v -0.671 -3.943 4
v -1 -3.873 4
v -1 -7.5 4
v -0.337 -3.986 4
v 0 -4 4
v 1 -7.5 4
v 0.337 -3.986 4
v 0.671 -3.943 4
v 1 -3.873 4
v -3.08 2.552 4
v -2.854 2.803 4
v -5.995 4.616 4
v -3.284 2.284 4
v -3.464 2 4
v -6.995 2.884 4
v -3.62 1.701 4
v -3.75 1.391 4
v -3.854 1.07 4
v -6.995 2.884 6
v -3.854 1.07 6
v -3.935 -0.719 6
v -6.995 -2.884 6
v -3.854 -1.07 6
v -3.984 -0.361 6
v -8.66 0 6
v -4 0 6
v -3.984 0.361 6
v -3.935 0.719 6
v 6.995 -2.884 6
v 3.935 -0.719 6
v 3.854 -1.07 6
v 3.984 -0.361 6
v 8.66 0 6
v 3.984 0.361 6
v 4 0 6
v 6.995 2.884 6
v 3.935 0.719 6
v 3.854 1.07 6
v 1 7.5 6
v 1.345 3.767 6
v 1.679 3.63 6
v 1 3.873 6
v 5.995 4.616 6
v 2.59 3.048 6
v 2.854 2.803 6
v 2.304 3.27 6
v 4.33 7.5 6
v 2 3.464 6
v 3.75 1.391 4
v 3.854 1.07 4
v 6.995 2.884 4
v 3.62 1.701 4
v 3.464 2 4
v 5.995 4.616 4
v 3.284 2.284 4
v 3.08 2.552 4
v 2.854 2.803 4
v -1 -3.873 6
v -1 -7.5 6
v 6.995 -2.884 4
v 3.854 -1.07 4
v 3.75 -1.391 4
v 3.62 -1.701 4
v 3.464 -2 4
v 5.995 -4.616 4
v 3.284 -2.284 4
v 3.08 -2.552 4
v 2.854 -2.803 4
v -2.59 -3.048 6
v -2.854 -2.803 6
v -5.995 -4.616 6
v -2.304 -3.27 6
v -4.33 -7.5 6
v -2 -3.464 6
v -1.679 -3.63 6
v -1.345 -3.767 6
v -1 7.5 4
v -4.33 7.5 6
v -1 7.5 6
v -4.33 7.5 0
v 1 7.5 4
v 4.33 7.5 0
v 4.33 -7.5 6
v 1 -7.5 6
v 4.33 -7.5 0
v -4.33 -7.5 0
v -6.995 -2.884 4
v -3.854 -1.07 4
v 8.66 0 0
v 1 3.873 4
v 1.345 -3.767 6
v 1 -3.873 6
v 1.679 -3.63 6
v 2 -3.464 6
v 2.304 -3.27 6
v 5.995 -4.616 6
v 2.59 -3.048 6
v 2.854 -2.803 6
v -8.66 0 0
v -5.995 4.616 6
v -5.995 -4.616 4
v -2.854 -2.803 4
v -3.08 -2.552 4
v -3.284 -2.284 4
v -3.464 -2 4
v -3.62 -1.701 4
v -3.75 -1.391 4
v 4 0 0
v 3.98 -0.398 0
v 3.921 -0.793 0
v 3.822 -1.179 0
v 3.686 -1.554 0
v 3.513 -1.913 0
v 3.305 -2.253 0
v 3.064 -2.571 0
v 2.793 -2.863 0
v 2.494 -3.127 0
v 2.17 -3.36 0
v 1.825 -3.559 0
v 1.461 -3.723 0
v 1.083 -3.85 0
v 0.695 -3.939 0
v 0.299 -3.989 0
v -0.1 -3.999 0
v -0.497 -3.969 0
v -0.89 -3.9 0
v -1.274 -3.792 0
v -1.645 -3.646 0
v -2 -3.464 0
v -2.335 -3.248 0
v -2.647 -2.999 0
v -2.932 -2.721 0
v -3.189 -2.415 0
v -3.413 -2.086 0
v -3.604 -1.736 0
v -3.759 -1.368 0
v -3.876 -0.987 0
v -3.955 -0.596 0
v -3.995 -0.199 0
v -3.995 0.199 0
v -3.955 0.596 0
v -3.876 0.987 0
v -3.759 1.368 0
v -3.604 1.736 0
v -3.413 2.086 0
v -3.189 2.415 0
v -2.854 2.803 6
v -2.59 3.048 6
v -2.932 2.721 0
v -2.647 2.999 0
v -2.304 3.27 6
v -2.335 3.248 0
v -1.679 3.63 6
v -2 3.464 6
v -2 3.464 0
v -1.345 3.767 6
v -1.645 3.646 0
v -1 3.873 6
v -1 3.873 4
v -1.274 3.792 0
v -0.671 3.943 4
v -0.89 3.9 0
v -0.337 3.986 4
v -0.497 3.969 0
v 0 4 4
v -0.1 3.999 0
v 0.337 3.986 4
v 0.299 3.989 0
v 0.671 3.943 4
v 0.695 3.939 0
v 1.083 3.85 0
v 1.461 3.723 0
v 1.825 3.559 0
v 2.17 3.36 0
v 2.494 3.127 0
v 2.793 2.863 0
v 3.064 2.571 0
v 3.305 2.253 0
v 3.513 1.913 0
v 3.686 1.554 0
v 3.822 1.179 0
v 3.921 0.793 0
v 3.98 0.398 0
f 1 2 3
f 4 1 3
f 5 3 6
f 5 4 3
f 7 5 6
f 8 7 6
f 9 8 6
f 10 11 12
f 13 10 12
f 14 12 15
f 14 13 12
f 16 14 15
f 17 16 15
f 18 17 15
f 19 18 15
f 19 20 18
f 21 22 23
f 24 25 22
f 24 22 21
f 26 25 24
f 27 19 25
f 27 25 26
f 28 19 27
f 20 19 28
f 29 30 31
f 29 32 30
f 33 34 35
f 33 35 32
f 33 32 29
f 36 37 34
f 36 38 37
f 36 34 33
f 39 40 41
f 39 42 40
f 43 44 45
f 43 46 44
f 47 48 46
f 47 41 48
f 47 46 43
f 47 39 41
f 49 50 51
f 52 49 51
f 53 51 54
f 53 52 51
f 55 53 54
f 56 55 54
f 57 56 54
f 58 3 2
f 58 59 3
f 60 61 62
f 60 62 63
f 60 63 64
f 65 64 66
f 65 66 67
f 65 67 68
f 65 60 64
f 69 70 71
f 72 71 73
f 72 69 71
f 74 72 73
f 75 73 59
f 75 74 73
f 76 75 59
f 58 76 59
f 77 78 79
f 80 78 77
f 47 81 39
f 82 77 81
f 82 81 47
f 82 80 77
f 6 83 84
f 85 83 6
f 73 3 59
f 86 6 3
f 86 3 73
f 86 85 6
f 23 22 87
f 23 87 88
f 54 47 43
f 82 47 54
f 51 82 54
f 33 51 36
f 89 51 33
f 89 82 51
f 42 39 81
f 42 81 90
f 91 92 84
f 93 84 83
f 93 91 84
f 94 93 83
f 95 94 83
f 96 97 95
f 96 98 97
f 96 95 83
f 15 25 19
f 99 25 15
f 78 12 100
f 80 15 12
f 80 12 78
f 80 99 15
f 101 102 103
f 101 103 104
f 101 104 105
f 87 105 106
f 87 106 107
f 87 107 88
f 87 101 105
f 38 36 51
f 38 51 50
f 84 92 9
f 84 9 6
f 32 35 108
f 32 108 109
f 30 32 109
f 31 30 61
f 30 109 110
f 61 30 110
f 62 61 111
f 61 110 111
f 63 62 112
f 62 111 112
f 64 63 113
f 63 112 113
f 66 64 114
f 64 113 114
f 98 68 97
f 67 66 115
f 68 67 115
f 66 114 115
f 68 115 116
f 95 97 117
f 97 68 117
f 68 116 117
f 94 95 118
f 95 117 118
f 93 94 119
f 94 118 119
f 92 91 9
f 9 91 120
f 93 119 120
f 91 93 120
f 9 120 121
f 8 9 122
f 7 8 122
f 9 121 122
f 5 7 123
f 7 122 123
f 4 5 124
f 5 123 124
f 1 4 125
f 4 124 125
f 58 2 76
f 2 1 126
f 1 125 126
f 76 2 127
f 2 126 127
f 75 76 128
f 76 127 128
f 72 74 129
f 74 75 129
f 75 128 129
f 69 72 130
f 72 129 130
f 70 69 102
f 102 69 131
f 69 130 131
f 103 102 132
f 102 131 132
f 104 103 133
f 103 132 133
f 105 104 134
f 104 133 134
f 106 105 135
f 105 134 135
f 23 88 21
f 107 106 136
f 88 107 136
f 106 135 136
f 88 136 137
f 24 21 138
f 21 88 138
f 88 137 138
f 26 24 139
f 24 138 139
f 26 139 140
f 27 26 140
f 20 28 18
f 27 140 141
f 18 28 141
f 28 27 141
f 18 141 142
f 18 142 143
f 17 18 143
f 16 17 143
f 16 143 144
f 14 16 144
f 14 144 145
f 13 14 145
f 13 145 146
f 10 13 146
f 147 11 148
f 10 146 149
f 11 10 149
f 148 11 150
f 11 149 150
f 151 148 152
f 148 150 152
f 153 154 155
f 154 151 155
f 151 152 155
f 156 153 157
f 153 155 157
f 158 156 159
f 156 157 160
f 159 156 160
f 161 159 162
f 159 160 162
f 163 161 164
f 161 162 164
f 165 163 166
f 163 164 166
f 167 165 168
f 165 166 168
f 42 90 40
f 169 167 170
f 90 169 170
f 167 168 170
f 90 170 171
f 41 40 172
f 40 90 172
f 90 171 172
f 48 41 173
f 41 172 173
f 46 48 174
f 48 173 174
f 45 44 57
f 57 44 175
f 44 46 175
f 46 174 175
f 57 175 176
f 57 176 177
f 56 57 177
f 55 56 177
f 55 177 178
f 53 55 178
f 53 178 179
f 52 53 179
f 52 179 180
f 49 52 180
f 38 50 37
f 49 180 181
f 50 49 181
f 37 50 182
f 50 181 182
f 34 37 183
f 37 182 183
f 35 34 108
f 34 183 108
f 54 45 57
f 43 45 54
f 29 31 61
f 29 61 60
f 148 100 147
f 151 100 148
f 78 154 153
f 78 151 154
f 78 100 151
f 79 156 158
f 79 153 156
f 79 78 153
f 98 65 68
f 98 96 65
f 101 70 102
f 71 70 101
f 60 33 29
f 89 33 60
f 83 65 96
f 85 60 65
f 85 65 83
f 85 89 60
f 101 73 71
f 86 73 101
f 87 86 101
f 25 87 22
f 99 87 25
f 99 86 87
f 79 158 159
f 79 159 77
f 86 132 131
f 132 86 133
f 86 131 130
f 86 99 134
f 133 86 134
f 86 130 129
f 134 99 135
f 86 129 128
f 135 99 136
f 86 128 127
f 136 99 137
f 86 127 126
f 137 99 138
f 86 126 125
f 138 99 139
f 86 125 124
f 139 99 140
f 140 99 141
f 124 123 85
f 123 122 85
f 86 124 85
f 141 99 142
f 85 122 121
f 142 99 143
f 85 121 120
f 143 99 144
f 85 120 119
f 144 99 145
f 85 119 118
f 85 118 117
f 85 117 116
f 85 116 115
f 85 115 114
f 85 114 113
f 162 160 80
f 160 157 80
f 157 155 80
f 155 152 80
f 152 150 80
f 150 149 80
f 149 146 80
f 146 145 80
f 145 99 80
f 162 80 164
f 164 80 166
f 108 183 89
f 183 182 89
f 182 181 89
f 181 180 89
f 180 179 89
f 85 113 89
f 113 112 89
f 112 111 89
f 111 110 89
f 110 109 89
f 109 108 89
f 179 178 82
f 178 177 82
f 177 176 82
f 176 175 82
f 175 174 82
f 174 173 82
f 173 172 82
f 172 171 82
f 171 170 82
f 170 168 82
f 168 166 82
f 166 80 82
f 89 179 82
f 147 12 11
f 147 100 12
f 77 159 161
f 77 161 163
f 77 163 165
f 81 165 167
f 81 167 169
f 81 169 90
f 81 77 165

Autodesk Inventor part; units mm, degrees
ref_plane "YZ Plane" through (0, 0, 0) normal (1, 0, 0) x (0, 1, 0)
ref_plane "XZ Plane" through (0, 0, 0) normal (0, 1, 0) x (-1, 0, 0)
ref_plane "XY Plane" through (0, 0, 0) normal (0, 0, 1) x (1, 0, 0)
sketch "草图2" plane through (0, 0, 0) normal (0, 0, 1) x (1, 0, 0)
  line L0 (4.3301, -7.5) -> (-4.3301, -7.5)
  line L1 (-4.3301, -7.5) -> (-8.6603, 0)
  line L2 (-8.6603, 0) -> (-4.3301, 7.5)
  line L3 (-4.3301, 7.5) -> (4.3301, 7.5)
  line L4 (4.3301, 7.5) -> (8.6603, 0)
  line L5 (8.6603, 0) -> (4.3301, -7.5)
  line L6 (0, 0) -> (0, 3.4444)
  circle A0 centre (0, 0) radius 4
  point P0 (0, 7.5)
  dimension "d6" = 3.4444
  dimension "d7" = 15
  dimension "d8" = 8
extrude "拉伸2" add sketch "草图2" along normal blind 6
thread "螺纹1" size "M8x1.25" class "6H" standard "ANSI Metric M Profile" full length
sketch "草图3" plane through (0, 0, 6) normal (0, 0, 1) x (1, 0, 0)
  line L0 (-4.3301, -7.5) -> (4.3301, -7.5) projected
  line L1 (-1, 7.5) -> (1, 7.5)
  line L2 (1, 7.5) -> (1, -7.5)
  line L3 (1, -7.5) -> (-1, -7.5)
  line L4 (-1, -7.5) -> (-1, 7.5)
  point P0 (0, 0)
  dimension "d13" = 2
  dimension "d14" = 1
  dimension "d15" = 15
extrude "拉伸3" cut sketch "草图3" against normal blind 2
pattern_circular "环形阵列1" count 3 over 360 about axis through (0, 0, -10) along (0, 0, 1) of "拉伸3"
properties part number "砂轮架固定销螺丝"
